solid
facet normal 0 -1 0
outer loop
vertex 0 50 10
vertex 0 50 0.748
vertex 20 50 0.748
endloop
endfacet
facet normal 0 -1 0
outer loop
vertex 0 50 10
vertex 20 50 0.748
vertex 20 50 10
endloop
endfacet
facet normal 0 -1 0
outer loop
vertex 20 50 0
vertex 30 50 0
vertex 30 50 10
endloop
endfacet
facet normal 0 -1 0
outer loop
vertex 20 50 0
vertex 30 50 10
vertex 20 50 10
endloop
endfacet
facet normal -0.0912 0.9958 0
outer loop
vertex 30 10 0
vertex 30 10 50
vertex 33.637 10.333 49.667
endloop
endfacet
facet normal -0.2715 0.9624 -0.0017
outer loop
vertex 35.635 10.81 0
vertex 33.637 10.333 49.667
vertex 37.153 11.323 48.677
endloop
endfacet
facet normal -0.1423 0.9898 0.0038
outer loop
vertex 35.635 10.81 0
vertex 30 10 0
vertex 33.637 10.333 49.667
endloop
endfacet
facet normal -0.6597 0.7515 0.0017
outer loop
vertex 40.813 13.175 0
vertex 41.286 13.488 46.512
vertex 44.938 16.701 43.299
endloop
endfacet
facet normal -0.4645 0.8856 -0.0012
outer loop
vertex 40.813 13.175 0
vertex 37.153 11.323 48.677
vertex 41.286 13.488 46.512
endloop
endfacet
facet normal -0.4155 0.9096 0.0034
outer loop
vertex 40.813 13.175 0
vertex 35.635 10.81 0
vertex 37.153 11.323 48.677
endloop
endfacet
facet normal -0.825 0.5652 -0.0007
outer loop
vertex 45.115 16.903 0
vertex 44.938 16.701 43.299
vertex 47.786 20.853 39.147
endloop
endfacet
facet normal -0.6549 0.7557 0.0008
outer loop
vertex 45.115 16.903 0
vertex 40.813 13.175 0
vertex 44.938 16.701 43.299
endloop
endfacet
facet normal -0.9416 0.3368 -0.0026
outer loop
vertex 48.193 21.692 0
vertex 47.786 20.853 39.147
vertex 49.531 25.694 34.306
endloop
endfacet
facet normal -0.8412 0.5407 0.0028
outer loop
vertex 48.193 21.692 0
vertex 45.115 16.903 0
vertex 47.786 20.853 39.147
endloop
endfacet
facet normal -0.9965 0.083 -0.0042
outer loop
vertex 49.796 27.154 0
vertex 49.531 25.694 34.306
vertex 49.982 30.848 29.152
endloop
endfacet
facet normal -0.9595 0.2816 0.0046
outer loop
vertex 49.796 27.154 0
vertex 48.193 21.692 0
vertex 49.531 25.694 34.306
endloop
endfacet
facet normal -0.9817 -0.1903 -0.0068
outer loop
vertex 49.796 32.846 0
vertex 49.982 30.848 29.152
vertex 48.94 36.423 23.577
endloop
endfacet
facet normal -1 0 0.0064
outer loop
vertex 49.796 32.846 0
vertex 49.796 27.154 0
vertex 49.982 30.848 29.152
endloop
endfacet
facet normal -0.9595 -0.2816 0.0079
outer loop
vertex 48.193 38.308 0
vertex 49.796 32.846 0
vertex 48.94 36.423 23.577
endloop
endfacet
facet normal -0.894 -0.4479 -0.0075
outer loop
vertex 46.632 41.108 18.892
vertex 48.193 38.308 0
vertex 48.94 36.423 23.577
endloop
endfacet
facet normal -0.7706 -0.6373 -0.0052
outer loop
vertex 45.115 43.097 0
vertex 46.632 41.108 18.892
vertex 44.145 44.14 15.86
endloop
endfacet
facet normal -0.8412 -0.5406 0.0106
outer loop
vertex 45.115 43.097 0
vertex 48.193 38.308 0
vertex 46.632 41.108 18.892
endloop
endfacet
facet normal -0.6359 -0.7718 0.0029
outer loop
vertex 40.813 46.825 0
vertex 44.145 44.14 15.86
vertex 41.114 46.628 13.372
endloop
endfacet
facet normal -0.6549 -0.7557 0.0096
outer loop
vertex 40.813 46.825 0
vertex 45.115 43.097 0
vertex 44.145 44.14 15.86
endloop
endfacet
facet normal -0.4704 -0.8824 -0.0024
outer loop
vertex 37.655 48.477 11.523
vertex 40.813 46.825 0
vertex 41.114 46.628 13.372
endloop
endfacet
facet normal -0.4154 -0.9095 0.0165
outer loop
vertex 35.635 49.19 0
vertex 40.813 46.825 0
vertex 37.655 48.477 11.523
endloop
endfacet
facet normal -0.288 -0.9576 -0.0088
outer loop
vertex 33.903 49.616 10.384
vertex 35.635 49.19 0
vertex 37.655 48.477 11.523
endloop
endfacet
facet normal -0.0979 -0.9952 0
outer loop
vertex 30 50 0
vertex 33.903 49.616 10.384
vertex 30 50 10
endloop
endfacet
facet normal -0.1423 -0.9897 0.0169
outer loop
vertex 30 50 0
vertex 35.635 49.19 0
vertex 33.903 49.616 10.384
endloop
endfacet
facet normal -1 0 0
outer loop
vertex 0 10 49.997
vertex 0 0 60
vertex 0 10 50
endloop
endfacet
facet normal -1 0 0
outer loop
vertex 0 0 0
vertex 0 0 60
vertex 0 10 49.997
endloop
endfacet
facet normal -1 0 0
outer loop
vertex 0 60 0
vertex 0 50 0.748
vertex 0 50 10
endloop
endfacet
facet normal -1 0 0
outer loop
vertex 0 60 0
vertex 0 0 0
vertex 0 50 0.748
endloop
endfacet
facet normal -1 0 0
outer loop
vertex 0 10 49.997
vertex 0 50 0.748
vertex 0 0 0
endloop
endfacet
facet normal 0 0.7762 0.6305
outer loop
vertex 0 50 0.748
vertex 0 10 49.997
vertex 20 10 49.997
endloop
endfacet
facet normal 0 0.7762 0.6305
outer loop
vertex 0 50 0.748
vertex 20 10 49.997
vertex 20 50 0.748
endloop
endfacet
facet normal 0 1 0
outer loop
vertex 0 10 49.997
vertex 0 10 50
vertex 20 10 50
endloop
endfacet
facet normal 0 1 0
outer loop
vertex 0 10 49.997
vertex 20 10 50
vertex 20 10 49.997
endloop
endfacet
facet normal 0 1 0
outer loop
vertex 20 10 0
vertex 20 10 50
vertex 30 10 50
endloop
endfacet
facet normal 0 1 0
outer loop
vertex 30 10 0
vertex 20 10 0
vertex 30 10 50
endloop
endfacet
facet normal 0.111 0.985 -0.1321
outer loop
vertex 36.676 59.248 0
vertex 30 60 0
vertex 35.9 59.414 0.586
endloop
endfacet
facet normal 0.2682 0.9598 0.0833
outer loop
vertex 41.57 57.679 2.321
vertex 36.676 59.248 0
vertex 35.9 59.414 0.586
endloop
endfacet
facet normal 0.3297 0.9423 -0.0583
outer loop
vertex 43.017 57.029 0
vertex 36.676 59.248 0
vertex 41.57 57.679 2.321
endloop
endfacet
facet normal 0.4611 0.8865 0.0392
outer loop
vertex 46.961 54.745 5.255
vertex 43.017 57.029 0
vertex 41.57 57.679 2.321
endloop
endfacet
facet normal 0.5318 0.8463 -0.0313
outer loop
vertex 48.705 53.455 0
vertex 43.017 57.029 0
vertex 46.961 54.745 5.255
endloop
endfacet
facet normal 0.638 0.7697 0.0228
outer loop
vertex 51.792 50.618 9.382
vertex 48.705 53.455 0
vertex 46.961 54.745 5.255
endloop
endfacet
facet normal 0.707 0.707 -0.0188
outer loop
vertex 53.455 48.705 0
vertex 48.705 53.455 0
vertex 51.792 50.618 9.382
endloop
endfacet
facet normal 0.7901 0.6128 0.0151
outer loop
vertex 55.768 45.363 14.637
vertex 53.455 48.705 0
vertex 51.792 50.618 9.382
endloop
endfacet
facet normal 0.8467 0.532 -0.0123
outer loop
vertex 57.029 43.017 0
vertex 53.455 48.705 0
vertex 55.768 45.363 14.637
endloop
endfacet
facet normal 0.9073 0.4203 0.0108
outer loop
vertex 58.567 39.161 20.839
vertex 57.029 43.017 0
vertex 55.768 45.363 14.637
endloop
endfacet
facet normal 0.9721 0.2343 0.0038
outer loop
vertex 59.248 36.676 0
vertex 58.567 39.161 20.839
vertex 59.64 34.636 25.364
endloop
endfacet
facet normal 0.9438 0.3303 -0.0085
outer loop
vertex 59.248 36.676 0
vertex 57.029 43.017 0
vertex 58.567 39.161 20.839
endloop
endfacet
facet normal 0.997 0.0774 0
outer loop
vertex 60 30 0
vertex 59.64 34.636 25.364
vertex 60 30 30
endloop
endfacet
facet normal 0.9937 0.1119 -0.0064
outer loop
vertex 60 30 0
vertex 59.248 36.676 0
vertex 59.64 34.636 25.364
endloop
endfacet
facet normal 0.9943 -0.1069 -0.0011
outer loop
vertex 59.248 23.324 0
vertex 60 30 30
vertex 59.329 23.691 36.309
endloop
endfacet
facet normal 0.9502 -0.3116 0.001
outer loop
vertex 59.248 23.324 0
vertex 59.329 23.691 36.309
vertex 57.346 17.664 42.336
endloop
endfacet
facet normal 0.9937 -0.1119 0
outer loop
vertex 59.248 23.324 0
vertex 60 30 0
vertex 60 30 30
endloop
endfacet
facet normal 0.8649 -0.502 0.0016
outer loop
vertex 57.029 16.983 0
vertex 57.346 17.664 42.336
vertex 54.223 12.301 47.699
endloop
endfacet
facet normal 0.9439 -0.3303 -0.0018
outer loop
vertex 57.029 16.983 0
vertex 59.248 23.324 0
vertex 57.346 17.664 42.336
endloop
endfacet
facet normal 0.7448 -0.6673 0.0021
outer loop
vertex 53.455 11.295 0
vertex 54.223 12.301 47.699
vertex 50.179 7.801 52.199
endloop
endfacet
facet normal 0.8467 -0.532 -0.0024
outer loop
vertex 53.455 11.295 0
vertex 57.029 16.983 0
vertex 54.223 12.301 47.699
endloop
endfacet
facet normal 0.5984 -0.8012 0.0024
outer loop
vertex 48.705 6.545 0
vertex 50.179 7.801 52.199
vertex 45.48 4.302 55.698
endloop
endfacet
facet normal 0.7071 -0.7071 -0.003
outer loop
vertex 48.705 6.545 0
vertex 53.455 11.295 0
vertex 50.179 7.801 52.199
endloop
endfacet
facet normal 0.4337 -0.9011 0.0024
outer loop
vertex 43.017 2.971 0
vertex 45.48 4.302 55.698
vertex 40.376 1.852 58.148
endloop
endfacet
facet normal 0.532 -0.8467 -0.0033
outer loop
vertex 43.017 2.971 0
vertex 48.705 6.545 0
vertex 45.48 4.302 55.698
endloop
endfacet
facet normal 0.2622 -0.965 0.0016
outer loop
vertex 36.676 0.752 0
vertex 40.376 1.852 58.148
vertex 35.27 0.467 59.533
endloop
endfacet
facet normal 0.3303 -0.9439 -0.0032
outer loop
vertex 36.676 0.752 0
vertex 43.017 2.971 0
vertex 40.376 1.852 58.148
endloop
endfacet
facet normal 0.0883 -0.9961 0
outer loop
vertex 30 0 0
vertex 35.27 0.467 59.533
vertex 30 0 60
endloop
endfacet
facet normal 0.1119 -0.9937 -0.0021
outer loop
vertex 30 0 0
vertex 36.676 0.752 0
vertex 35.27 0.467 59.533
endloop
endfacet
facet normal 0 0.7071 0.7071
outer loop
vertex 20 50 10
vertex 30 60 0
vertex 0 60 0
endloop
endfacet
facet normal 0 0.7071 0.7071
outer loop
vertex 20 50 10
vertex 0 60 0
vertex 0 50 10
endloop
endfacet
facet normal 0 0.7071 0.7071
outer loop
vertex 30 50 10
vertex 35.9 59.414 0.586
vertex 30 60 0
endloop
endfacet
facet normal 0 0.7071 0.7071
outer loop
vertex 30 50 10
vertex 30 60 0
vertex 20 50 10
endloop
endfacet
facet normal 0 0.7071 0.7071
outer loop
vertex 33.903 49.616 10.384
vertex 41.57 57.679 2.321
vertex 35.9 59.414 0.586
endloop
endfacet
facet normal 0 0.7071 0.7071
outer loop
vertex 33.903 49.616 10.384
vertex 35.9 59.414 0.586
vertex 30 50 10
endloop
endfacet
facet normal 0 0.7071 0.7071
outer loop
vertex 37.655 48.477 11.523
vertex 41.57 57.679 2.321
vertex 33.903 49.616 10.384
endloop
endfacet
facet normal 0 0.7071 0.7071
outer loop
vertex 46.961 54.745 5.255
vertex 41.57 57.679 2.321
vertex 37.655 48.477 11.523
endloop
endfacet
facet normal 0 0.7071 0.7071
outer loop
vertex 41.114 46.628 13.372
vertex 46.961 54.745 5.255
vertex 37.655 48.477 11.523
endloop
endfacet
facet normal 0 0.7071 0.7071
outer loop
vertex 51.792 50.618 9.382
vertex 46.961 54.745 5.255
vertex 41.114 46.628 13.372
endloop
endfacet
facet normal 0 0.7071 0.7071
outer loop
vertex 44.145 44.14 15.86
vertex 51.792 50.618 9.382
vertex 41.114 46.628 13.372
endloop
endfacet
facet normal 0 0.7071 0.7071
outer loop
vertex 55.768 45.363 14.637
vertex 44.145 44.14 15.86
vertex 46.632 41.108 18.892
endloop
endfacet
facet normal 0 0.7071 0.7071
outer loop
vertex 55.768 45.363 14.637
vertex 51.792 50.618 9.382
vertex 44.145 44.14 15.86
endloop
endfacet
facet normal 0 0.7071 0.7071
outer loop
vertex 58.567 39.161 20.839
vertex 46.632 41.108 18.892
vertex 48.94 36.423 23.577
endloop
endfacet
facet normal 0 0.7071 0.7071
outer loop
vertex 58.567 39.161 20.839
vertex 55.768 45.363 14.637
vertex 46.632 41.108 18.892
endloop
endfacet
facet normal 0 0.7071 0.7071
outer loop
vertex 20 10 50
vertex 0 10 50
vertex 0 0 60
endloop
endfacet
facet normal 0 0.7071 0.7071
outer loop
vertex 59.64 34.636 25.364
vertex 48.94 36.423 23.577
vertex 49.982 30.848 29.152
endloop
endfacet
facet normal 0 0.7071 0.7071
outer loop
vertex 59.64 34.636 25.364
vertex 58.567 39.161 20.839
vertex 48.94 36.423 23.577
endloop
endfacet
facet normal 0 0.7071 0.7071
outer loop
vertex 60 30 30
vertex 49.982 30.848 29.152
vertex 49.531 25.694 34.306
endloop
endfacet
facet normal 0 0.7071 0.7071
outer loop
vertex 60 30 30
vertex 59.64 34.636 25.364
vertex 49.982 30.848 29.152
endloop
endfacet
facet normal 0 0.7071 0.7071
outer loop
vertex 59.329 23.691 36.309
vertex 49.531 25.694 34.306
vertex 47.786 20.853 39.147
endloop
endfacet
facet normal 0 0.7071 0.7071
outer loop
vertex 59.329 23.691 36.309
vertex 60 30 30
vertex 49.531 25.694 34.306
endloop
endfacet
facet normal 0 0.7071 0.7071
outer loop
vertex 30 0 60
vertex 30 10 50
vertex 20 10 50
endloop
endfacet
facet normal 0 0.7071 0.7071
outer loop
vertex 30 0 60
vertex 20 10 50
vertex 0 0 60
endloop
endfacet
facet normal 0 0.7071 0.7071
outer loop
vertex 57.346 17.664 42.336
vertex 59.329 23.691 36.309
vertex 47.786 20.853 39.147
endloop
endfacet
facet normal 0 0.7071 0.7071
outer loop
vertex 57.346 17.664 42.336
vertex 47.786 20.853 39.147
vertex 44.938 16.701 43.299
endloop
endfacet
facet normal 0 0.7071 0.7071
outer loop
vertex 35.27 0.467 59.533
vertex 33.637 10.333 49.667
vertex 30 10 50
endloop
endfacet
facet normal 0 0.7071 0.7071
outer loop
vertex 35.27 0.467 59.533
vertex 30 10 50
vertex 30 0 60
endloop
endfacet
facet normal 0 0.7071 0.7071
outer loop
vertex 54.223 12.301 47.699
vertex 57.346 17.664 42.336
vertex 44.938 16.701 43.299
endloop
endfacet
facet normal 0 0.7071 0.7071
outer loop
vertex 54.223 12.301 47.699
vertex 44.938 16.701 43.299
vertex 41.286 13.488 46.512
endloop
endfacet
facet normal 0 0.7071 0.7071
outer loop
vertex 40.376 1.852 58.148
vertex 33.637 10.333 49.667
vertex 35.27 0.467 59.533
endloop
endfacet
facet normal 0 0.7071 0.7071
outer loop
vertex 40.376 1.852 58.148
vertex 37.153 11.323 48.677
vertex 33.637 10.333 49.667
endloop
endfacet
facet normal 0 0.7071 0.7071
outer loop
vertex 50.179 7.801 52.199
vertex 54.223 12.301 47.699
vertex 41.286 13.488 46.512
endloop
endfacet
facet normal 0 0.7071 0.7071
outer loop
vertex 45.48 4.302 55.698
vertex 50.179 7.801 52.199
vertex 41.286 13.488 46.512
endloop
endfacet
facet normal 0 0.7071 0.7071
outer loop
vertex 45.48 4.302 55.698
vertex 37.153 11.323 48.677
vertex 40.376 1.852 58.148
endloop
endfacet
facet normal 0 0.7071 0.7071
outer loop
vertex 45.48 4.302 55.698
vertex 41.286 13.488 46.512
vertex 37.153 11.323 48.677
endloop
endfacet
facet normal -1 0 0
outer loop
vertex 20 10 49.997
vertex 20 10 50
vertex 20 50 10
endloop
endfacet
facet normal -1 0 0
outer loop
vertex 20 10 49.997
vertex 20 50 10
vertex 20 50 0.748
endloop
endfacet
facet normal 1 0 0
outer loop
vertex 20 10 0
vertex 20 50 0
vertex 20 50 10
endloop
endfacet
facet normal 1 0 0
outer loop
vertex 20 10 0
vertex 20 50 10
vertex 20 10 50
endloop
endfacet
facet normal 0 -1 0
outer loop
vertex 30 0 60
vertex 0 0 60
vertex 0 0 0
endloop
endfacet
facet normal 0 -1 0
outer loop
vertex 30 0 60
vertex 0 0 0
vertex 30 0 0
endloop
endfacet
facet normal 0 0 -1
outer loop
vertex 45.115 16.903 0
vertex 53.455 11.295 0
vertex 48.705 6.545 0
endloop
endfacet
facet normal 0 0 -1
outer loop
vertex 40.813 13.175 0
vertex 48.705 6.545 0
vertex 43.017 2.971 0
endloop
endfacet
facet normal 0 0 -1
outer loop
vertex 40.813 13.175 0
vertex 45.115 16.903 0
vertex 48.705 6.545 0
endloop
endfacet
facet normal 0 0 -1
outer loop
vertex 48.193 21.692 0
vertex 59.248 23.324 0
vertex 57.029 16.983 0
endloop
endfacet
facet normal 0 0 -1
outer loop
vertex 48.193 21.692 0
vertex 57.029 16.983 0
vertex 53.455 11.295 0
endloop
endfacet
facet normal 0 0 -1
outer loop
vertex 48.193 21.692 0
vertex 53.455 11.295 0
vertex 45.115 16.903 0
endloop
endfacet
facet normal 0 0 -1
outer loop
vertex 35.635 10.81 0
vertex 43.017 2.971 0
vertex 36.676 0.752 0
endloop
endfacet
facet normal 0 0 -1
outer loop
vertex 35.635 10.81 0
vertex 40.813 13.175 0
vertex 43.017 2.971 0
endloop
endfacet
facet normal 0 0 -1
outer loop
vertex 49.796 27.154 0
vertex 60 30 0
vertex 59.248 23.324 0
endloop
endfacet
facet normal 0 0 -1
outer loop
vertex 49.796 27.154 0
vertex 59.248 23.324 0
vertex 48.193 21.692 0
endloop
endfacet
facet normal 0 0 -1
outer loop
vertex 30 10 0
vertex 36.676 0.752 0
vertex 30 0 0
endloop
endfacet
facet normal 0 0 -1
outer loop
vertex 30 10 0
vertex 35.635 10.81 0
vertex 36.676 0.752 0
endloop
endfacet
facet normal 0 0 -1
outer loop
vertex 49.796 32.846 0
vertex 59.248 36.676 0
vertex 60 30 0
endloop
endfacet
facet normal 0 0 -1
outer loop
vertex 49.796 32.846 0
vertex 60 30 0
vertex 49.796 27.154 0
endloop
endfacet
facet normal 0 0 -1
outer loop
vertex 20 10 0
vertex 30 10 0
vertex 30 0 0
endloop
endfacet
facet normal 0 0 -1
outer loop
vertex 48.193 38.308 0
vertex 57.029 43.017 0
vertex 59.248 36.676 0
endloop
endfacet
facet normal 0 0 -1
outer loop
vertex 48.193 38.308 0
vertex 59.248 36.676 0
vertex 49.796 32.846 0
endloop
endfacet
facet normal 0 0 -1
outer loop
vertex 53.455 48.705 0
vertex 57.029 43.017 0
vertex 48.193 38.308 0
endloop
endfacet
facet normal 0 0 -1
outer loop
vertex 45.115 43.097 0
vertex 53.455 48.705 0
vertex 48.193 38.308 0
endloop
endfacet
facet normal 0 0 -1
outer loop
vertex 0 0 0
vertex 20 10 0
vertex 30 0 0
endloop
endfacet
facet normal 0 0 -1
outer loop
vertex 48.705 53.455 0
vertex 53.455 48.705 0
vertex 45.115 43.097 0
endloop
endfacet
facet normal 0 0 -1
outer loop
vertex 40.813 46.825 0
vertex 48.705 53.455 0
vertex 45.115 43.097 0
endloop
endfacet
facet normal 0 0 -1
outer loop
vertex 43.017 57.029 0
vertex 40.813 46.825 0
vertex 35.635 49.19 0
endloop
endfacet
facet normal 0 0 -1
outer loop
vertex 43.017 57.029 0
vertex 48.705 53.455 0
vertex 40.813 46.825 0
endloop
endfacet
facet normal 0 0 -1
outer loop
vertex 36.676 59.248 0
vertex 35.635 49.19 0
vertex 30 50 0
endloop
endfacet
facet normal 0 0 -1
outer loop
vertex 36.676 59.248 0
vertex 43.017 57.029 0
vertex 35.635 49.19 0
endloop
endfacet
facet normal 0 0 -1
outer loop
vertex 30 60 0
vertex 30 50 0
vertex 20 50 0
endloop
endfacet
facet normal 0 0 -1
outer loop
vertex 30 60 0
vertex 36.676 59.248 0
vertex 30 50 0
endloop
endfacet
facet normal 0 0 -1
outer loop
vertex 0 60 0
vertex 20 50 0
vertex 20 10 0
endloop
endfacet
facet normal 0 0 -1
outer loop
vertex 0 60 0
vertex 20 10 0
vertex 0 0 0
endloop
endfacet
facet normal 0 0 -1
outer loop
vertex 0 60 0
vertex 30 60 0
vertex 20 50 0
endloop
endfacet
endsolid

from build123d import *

# Parameters (mm, degrees)
SKETCH1_W           = 30
SKETCH1_H           = 60
BOSS_EXTRUDE1_DEPTH = 60
CUT_EXTRUDE1_DEPTH  = 60
SKETCH4_W           = 20
SKETCH4_H           = 40
CUT_EXTRUDE2_DEPTH  = 60
CUT_EXTRUDE3_DEPTH  = 60
BOSS_EXTRUDE2_DEPTH = 20
CUT_EXTRUDE9_DEPTH  = 20


with BuildPart() as part:
    # Sketch1 → Boss-Extrude1 (new body)
    with BuildSketch(Plane.XY):
        with BuildLine():
            ThreePointArc((30, 60), (60, 30), (30, 0))
            Line((30, 0), (30, 60))
        make_face()
        with Locations((15, 30)):
            Rectangle(SKETCH1_W, SKETCH1_H)
    extrude(amount=BOSS_EXTRUDE1_DEPTH)

    # Sketch2 → Cut-Extrude1 (cut)
    with BuildSketch(Plane.ZY):
        Polygon((0, 60), (60, 0), (60, 60), align=None)
    extrude(amount=-CUT_EXTRUDE1_DEPTH, mode=Mode.SUBTRACT)

    # Sketch4 → Cut-Extrude2 (cut)
    with BuildSketch(Plane(origin=(0, 0, 0), x_dir=(-1, 0, 0), z_dir=(0, 0, -1))):
        with Locations((-10.0001, 30)):
            Rectangle(SKETCH4_W, SKETCH4_H)
    extrude(amount=-CUT_EXTRUDE2_DEPTH, mode=Mode.SUBTRACT)

    # Sketch5 → Cut-Extrude3 (cut)
    with BuildSketch(Plane(origin=(0, 0, 0), x_dir=(-1, 0, 0), z_dir=(0, 0, -1))):
        with BuildLine():
            Line((-30, 50), (-20.0003, 50))
            Line((-20.0003, 50), (-20.0003, 10.000000002))
            Line((-20.0003, 10.000000002), (-30.0003, 10.000000002))
            ThreePointArc((-30.0003, 10.000000002), (-49.999999999, 30.00015), (-30, 50))
        make_face()
    extrude(amount=-CUT_EXTRUDE3_DEPTH, mode=Mode.SUBTRACT)

    # Sketch6 → Boss-Extrude2 (add)
    with BuildSketch(Plane.ZY.offset(-20.0001)):
        Polygon((0, 50.000000001), (9.999999999, 50.000000001), (50, 10), (0, 10), align=None)
    extrude(amount=BOSS_EXTRUDE2_DEPTH)

    # Sketch7 → Cut-Extrude9 (cut)
    with BuildSketch(Plane.ZY):
        Polygon((49.999999998, 10.000000002), (49.996907355, 10.000000002), (0.748306112, 50), (10, 50), align=None)
    extrude(amount=-CUT_EXTRUDE9_DEPTH, mode=Mode.SUBTRACT)


solid = part.part
